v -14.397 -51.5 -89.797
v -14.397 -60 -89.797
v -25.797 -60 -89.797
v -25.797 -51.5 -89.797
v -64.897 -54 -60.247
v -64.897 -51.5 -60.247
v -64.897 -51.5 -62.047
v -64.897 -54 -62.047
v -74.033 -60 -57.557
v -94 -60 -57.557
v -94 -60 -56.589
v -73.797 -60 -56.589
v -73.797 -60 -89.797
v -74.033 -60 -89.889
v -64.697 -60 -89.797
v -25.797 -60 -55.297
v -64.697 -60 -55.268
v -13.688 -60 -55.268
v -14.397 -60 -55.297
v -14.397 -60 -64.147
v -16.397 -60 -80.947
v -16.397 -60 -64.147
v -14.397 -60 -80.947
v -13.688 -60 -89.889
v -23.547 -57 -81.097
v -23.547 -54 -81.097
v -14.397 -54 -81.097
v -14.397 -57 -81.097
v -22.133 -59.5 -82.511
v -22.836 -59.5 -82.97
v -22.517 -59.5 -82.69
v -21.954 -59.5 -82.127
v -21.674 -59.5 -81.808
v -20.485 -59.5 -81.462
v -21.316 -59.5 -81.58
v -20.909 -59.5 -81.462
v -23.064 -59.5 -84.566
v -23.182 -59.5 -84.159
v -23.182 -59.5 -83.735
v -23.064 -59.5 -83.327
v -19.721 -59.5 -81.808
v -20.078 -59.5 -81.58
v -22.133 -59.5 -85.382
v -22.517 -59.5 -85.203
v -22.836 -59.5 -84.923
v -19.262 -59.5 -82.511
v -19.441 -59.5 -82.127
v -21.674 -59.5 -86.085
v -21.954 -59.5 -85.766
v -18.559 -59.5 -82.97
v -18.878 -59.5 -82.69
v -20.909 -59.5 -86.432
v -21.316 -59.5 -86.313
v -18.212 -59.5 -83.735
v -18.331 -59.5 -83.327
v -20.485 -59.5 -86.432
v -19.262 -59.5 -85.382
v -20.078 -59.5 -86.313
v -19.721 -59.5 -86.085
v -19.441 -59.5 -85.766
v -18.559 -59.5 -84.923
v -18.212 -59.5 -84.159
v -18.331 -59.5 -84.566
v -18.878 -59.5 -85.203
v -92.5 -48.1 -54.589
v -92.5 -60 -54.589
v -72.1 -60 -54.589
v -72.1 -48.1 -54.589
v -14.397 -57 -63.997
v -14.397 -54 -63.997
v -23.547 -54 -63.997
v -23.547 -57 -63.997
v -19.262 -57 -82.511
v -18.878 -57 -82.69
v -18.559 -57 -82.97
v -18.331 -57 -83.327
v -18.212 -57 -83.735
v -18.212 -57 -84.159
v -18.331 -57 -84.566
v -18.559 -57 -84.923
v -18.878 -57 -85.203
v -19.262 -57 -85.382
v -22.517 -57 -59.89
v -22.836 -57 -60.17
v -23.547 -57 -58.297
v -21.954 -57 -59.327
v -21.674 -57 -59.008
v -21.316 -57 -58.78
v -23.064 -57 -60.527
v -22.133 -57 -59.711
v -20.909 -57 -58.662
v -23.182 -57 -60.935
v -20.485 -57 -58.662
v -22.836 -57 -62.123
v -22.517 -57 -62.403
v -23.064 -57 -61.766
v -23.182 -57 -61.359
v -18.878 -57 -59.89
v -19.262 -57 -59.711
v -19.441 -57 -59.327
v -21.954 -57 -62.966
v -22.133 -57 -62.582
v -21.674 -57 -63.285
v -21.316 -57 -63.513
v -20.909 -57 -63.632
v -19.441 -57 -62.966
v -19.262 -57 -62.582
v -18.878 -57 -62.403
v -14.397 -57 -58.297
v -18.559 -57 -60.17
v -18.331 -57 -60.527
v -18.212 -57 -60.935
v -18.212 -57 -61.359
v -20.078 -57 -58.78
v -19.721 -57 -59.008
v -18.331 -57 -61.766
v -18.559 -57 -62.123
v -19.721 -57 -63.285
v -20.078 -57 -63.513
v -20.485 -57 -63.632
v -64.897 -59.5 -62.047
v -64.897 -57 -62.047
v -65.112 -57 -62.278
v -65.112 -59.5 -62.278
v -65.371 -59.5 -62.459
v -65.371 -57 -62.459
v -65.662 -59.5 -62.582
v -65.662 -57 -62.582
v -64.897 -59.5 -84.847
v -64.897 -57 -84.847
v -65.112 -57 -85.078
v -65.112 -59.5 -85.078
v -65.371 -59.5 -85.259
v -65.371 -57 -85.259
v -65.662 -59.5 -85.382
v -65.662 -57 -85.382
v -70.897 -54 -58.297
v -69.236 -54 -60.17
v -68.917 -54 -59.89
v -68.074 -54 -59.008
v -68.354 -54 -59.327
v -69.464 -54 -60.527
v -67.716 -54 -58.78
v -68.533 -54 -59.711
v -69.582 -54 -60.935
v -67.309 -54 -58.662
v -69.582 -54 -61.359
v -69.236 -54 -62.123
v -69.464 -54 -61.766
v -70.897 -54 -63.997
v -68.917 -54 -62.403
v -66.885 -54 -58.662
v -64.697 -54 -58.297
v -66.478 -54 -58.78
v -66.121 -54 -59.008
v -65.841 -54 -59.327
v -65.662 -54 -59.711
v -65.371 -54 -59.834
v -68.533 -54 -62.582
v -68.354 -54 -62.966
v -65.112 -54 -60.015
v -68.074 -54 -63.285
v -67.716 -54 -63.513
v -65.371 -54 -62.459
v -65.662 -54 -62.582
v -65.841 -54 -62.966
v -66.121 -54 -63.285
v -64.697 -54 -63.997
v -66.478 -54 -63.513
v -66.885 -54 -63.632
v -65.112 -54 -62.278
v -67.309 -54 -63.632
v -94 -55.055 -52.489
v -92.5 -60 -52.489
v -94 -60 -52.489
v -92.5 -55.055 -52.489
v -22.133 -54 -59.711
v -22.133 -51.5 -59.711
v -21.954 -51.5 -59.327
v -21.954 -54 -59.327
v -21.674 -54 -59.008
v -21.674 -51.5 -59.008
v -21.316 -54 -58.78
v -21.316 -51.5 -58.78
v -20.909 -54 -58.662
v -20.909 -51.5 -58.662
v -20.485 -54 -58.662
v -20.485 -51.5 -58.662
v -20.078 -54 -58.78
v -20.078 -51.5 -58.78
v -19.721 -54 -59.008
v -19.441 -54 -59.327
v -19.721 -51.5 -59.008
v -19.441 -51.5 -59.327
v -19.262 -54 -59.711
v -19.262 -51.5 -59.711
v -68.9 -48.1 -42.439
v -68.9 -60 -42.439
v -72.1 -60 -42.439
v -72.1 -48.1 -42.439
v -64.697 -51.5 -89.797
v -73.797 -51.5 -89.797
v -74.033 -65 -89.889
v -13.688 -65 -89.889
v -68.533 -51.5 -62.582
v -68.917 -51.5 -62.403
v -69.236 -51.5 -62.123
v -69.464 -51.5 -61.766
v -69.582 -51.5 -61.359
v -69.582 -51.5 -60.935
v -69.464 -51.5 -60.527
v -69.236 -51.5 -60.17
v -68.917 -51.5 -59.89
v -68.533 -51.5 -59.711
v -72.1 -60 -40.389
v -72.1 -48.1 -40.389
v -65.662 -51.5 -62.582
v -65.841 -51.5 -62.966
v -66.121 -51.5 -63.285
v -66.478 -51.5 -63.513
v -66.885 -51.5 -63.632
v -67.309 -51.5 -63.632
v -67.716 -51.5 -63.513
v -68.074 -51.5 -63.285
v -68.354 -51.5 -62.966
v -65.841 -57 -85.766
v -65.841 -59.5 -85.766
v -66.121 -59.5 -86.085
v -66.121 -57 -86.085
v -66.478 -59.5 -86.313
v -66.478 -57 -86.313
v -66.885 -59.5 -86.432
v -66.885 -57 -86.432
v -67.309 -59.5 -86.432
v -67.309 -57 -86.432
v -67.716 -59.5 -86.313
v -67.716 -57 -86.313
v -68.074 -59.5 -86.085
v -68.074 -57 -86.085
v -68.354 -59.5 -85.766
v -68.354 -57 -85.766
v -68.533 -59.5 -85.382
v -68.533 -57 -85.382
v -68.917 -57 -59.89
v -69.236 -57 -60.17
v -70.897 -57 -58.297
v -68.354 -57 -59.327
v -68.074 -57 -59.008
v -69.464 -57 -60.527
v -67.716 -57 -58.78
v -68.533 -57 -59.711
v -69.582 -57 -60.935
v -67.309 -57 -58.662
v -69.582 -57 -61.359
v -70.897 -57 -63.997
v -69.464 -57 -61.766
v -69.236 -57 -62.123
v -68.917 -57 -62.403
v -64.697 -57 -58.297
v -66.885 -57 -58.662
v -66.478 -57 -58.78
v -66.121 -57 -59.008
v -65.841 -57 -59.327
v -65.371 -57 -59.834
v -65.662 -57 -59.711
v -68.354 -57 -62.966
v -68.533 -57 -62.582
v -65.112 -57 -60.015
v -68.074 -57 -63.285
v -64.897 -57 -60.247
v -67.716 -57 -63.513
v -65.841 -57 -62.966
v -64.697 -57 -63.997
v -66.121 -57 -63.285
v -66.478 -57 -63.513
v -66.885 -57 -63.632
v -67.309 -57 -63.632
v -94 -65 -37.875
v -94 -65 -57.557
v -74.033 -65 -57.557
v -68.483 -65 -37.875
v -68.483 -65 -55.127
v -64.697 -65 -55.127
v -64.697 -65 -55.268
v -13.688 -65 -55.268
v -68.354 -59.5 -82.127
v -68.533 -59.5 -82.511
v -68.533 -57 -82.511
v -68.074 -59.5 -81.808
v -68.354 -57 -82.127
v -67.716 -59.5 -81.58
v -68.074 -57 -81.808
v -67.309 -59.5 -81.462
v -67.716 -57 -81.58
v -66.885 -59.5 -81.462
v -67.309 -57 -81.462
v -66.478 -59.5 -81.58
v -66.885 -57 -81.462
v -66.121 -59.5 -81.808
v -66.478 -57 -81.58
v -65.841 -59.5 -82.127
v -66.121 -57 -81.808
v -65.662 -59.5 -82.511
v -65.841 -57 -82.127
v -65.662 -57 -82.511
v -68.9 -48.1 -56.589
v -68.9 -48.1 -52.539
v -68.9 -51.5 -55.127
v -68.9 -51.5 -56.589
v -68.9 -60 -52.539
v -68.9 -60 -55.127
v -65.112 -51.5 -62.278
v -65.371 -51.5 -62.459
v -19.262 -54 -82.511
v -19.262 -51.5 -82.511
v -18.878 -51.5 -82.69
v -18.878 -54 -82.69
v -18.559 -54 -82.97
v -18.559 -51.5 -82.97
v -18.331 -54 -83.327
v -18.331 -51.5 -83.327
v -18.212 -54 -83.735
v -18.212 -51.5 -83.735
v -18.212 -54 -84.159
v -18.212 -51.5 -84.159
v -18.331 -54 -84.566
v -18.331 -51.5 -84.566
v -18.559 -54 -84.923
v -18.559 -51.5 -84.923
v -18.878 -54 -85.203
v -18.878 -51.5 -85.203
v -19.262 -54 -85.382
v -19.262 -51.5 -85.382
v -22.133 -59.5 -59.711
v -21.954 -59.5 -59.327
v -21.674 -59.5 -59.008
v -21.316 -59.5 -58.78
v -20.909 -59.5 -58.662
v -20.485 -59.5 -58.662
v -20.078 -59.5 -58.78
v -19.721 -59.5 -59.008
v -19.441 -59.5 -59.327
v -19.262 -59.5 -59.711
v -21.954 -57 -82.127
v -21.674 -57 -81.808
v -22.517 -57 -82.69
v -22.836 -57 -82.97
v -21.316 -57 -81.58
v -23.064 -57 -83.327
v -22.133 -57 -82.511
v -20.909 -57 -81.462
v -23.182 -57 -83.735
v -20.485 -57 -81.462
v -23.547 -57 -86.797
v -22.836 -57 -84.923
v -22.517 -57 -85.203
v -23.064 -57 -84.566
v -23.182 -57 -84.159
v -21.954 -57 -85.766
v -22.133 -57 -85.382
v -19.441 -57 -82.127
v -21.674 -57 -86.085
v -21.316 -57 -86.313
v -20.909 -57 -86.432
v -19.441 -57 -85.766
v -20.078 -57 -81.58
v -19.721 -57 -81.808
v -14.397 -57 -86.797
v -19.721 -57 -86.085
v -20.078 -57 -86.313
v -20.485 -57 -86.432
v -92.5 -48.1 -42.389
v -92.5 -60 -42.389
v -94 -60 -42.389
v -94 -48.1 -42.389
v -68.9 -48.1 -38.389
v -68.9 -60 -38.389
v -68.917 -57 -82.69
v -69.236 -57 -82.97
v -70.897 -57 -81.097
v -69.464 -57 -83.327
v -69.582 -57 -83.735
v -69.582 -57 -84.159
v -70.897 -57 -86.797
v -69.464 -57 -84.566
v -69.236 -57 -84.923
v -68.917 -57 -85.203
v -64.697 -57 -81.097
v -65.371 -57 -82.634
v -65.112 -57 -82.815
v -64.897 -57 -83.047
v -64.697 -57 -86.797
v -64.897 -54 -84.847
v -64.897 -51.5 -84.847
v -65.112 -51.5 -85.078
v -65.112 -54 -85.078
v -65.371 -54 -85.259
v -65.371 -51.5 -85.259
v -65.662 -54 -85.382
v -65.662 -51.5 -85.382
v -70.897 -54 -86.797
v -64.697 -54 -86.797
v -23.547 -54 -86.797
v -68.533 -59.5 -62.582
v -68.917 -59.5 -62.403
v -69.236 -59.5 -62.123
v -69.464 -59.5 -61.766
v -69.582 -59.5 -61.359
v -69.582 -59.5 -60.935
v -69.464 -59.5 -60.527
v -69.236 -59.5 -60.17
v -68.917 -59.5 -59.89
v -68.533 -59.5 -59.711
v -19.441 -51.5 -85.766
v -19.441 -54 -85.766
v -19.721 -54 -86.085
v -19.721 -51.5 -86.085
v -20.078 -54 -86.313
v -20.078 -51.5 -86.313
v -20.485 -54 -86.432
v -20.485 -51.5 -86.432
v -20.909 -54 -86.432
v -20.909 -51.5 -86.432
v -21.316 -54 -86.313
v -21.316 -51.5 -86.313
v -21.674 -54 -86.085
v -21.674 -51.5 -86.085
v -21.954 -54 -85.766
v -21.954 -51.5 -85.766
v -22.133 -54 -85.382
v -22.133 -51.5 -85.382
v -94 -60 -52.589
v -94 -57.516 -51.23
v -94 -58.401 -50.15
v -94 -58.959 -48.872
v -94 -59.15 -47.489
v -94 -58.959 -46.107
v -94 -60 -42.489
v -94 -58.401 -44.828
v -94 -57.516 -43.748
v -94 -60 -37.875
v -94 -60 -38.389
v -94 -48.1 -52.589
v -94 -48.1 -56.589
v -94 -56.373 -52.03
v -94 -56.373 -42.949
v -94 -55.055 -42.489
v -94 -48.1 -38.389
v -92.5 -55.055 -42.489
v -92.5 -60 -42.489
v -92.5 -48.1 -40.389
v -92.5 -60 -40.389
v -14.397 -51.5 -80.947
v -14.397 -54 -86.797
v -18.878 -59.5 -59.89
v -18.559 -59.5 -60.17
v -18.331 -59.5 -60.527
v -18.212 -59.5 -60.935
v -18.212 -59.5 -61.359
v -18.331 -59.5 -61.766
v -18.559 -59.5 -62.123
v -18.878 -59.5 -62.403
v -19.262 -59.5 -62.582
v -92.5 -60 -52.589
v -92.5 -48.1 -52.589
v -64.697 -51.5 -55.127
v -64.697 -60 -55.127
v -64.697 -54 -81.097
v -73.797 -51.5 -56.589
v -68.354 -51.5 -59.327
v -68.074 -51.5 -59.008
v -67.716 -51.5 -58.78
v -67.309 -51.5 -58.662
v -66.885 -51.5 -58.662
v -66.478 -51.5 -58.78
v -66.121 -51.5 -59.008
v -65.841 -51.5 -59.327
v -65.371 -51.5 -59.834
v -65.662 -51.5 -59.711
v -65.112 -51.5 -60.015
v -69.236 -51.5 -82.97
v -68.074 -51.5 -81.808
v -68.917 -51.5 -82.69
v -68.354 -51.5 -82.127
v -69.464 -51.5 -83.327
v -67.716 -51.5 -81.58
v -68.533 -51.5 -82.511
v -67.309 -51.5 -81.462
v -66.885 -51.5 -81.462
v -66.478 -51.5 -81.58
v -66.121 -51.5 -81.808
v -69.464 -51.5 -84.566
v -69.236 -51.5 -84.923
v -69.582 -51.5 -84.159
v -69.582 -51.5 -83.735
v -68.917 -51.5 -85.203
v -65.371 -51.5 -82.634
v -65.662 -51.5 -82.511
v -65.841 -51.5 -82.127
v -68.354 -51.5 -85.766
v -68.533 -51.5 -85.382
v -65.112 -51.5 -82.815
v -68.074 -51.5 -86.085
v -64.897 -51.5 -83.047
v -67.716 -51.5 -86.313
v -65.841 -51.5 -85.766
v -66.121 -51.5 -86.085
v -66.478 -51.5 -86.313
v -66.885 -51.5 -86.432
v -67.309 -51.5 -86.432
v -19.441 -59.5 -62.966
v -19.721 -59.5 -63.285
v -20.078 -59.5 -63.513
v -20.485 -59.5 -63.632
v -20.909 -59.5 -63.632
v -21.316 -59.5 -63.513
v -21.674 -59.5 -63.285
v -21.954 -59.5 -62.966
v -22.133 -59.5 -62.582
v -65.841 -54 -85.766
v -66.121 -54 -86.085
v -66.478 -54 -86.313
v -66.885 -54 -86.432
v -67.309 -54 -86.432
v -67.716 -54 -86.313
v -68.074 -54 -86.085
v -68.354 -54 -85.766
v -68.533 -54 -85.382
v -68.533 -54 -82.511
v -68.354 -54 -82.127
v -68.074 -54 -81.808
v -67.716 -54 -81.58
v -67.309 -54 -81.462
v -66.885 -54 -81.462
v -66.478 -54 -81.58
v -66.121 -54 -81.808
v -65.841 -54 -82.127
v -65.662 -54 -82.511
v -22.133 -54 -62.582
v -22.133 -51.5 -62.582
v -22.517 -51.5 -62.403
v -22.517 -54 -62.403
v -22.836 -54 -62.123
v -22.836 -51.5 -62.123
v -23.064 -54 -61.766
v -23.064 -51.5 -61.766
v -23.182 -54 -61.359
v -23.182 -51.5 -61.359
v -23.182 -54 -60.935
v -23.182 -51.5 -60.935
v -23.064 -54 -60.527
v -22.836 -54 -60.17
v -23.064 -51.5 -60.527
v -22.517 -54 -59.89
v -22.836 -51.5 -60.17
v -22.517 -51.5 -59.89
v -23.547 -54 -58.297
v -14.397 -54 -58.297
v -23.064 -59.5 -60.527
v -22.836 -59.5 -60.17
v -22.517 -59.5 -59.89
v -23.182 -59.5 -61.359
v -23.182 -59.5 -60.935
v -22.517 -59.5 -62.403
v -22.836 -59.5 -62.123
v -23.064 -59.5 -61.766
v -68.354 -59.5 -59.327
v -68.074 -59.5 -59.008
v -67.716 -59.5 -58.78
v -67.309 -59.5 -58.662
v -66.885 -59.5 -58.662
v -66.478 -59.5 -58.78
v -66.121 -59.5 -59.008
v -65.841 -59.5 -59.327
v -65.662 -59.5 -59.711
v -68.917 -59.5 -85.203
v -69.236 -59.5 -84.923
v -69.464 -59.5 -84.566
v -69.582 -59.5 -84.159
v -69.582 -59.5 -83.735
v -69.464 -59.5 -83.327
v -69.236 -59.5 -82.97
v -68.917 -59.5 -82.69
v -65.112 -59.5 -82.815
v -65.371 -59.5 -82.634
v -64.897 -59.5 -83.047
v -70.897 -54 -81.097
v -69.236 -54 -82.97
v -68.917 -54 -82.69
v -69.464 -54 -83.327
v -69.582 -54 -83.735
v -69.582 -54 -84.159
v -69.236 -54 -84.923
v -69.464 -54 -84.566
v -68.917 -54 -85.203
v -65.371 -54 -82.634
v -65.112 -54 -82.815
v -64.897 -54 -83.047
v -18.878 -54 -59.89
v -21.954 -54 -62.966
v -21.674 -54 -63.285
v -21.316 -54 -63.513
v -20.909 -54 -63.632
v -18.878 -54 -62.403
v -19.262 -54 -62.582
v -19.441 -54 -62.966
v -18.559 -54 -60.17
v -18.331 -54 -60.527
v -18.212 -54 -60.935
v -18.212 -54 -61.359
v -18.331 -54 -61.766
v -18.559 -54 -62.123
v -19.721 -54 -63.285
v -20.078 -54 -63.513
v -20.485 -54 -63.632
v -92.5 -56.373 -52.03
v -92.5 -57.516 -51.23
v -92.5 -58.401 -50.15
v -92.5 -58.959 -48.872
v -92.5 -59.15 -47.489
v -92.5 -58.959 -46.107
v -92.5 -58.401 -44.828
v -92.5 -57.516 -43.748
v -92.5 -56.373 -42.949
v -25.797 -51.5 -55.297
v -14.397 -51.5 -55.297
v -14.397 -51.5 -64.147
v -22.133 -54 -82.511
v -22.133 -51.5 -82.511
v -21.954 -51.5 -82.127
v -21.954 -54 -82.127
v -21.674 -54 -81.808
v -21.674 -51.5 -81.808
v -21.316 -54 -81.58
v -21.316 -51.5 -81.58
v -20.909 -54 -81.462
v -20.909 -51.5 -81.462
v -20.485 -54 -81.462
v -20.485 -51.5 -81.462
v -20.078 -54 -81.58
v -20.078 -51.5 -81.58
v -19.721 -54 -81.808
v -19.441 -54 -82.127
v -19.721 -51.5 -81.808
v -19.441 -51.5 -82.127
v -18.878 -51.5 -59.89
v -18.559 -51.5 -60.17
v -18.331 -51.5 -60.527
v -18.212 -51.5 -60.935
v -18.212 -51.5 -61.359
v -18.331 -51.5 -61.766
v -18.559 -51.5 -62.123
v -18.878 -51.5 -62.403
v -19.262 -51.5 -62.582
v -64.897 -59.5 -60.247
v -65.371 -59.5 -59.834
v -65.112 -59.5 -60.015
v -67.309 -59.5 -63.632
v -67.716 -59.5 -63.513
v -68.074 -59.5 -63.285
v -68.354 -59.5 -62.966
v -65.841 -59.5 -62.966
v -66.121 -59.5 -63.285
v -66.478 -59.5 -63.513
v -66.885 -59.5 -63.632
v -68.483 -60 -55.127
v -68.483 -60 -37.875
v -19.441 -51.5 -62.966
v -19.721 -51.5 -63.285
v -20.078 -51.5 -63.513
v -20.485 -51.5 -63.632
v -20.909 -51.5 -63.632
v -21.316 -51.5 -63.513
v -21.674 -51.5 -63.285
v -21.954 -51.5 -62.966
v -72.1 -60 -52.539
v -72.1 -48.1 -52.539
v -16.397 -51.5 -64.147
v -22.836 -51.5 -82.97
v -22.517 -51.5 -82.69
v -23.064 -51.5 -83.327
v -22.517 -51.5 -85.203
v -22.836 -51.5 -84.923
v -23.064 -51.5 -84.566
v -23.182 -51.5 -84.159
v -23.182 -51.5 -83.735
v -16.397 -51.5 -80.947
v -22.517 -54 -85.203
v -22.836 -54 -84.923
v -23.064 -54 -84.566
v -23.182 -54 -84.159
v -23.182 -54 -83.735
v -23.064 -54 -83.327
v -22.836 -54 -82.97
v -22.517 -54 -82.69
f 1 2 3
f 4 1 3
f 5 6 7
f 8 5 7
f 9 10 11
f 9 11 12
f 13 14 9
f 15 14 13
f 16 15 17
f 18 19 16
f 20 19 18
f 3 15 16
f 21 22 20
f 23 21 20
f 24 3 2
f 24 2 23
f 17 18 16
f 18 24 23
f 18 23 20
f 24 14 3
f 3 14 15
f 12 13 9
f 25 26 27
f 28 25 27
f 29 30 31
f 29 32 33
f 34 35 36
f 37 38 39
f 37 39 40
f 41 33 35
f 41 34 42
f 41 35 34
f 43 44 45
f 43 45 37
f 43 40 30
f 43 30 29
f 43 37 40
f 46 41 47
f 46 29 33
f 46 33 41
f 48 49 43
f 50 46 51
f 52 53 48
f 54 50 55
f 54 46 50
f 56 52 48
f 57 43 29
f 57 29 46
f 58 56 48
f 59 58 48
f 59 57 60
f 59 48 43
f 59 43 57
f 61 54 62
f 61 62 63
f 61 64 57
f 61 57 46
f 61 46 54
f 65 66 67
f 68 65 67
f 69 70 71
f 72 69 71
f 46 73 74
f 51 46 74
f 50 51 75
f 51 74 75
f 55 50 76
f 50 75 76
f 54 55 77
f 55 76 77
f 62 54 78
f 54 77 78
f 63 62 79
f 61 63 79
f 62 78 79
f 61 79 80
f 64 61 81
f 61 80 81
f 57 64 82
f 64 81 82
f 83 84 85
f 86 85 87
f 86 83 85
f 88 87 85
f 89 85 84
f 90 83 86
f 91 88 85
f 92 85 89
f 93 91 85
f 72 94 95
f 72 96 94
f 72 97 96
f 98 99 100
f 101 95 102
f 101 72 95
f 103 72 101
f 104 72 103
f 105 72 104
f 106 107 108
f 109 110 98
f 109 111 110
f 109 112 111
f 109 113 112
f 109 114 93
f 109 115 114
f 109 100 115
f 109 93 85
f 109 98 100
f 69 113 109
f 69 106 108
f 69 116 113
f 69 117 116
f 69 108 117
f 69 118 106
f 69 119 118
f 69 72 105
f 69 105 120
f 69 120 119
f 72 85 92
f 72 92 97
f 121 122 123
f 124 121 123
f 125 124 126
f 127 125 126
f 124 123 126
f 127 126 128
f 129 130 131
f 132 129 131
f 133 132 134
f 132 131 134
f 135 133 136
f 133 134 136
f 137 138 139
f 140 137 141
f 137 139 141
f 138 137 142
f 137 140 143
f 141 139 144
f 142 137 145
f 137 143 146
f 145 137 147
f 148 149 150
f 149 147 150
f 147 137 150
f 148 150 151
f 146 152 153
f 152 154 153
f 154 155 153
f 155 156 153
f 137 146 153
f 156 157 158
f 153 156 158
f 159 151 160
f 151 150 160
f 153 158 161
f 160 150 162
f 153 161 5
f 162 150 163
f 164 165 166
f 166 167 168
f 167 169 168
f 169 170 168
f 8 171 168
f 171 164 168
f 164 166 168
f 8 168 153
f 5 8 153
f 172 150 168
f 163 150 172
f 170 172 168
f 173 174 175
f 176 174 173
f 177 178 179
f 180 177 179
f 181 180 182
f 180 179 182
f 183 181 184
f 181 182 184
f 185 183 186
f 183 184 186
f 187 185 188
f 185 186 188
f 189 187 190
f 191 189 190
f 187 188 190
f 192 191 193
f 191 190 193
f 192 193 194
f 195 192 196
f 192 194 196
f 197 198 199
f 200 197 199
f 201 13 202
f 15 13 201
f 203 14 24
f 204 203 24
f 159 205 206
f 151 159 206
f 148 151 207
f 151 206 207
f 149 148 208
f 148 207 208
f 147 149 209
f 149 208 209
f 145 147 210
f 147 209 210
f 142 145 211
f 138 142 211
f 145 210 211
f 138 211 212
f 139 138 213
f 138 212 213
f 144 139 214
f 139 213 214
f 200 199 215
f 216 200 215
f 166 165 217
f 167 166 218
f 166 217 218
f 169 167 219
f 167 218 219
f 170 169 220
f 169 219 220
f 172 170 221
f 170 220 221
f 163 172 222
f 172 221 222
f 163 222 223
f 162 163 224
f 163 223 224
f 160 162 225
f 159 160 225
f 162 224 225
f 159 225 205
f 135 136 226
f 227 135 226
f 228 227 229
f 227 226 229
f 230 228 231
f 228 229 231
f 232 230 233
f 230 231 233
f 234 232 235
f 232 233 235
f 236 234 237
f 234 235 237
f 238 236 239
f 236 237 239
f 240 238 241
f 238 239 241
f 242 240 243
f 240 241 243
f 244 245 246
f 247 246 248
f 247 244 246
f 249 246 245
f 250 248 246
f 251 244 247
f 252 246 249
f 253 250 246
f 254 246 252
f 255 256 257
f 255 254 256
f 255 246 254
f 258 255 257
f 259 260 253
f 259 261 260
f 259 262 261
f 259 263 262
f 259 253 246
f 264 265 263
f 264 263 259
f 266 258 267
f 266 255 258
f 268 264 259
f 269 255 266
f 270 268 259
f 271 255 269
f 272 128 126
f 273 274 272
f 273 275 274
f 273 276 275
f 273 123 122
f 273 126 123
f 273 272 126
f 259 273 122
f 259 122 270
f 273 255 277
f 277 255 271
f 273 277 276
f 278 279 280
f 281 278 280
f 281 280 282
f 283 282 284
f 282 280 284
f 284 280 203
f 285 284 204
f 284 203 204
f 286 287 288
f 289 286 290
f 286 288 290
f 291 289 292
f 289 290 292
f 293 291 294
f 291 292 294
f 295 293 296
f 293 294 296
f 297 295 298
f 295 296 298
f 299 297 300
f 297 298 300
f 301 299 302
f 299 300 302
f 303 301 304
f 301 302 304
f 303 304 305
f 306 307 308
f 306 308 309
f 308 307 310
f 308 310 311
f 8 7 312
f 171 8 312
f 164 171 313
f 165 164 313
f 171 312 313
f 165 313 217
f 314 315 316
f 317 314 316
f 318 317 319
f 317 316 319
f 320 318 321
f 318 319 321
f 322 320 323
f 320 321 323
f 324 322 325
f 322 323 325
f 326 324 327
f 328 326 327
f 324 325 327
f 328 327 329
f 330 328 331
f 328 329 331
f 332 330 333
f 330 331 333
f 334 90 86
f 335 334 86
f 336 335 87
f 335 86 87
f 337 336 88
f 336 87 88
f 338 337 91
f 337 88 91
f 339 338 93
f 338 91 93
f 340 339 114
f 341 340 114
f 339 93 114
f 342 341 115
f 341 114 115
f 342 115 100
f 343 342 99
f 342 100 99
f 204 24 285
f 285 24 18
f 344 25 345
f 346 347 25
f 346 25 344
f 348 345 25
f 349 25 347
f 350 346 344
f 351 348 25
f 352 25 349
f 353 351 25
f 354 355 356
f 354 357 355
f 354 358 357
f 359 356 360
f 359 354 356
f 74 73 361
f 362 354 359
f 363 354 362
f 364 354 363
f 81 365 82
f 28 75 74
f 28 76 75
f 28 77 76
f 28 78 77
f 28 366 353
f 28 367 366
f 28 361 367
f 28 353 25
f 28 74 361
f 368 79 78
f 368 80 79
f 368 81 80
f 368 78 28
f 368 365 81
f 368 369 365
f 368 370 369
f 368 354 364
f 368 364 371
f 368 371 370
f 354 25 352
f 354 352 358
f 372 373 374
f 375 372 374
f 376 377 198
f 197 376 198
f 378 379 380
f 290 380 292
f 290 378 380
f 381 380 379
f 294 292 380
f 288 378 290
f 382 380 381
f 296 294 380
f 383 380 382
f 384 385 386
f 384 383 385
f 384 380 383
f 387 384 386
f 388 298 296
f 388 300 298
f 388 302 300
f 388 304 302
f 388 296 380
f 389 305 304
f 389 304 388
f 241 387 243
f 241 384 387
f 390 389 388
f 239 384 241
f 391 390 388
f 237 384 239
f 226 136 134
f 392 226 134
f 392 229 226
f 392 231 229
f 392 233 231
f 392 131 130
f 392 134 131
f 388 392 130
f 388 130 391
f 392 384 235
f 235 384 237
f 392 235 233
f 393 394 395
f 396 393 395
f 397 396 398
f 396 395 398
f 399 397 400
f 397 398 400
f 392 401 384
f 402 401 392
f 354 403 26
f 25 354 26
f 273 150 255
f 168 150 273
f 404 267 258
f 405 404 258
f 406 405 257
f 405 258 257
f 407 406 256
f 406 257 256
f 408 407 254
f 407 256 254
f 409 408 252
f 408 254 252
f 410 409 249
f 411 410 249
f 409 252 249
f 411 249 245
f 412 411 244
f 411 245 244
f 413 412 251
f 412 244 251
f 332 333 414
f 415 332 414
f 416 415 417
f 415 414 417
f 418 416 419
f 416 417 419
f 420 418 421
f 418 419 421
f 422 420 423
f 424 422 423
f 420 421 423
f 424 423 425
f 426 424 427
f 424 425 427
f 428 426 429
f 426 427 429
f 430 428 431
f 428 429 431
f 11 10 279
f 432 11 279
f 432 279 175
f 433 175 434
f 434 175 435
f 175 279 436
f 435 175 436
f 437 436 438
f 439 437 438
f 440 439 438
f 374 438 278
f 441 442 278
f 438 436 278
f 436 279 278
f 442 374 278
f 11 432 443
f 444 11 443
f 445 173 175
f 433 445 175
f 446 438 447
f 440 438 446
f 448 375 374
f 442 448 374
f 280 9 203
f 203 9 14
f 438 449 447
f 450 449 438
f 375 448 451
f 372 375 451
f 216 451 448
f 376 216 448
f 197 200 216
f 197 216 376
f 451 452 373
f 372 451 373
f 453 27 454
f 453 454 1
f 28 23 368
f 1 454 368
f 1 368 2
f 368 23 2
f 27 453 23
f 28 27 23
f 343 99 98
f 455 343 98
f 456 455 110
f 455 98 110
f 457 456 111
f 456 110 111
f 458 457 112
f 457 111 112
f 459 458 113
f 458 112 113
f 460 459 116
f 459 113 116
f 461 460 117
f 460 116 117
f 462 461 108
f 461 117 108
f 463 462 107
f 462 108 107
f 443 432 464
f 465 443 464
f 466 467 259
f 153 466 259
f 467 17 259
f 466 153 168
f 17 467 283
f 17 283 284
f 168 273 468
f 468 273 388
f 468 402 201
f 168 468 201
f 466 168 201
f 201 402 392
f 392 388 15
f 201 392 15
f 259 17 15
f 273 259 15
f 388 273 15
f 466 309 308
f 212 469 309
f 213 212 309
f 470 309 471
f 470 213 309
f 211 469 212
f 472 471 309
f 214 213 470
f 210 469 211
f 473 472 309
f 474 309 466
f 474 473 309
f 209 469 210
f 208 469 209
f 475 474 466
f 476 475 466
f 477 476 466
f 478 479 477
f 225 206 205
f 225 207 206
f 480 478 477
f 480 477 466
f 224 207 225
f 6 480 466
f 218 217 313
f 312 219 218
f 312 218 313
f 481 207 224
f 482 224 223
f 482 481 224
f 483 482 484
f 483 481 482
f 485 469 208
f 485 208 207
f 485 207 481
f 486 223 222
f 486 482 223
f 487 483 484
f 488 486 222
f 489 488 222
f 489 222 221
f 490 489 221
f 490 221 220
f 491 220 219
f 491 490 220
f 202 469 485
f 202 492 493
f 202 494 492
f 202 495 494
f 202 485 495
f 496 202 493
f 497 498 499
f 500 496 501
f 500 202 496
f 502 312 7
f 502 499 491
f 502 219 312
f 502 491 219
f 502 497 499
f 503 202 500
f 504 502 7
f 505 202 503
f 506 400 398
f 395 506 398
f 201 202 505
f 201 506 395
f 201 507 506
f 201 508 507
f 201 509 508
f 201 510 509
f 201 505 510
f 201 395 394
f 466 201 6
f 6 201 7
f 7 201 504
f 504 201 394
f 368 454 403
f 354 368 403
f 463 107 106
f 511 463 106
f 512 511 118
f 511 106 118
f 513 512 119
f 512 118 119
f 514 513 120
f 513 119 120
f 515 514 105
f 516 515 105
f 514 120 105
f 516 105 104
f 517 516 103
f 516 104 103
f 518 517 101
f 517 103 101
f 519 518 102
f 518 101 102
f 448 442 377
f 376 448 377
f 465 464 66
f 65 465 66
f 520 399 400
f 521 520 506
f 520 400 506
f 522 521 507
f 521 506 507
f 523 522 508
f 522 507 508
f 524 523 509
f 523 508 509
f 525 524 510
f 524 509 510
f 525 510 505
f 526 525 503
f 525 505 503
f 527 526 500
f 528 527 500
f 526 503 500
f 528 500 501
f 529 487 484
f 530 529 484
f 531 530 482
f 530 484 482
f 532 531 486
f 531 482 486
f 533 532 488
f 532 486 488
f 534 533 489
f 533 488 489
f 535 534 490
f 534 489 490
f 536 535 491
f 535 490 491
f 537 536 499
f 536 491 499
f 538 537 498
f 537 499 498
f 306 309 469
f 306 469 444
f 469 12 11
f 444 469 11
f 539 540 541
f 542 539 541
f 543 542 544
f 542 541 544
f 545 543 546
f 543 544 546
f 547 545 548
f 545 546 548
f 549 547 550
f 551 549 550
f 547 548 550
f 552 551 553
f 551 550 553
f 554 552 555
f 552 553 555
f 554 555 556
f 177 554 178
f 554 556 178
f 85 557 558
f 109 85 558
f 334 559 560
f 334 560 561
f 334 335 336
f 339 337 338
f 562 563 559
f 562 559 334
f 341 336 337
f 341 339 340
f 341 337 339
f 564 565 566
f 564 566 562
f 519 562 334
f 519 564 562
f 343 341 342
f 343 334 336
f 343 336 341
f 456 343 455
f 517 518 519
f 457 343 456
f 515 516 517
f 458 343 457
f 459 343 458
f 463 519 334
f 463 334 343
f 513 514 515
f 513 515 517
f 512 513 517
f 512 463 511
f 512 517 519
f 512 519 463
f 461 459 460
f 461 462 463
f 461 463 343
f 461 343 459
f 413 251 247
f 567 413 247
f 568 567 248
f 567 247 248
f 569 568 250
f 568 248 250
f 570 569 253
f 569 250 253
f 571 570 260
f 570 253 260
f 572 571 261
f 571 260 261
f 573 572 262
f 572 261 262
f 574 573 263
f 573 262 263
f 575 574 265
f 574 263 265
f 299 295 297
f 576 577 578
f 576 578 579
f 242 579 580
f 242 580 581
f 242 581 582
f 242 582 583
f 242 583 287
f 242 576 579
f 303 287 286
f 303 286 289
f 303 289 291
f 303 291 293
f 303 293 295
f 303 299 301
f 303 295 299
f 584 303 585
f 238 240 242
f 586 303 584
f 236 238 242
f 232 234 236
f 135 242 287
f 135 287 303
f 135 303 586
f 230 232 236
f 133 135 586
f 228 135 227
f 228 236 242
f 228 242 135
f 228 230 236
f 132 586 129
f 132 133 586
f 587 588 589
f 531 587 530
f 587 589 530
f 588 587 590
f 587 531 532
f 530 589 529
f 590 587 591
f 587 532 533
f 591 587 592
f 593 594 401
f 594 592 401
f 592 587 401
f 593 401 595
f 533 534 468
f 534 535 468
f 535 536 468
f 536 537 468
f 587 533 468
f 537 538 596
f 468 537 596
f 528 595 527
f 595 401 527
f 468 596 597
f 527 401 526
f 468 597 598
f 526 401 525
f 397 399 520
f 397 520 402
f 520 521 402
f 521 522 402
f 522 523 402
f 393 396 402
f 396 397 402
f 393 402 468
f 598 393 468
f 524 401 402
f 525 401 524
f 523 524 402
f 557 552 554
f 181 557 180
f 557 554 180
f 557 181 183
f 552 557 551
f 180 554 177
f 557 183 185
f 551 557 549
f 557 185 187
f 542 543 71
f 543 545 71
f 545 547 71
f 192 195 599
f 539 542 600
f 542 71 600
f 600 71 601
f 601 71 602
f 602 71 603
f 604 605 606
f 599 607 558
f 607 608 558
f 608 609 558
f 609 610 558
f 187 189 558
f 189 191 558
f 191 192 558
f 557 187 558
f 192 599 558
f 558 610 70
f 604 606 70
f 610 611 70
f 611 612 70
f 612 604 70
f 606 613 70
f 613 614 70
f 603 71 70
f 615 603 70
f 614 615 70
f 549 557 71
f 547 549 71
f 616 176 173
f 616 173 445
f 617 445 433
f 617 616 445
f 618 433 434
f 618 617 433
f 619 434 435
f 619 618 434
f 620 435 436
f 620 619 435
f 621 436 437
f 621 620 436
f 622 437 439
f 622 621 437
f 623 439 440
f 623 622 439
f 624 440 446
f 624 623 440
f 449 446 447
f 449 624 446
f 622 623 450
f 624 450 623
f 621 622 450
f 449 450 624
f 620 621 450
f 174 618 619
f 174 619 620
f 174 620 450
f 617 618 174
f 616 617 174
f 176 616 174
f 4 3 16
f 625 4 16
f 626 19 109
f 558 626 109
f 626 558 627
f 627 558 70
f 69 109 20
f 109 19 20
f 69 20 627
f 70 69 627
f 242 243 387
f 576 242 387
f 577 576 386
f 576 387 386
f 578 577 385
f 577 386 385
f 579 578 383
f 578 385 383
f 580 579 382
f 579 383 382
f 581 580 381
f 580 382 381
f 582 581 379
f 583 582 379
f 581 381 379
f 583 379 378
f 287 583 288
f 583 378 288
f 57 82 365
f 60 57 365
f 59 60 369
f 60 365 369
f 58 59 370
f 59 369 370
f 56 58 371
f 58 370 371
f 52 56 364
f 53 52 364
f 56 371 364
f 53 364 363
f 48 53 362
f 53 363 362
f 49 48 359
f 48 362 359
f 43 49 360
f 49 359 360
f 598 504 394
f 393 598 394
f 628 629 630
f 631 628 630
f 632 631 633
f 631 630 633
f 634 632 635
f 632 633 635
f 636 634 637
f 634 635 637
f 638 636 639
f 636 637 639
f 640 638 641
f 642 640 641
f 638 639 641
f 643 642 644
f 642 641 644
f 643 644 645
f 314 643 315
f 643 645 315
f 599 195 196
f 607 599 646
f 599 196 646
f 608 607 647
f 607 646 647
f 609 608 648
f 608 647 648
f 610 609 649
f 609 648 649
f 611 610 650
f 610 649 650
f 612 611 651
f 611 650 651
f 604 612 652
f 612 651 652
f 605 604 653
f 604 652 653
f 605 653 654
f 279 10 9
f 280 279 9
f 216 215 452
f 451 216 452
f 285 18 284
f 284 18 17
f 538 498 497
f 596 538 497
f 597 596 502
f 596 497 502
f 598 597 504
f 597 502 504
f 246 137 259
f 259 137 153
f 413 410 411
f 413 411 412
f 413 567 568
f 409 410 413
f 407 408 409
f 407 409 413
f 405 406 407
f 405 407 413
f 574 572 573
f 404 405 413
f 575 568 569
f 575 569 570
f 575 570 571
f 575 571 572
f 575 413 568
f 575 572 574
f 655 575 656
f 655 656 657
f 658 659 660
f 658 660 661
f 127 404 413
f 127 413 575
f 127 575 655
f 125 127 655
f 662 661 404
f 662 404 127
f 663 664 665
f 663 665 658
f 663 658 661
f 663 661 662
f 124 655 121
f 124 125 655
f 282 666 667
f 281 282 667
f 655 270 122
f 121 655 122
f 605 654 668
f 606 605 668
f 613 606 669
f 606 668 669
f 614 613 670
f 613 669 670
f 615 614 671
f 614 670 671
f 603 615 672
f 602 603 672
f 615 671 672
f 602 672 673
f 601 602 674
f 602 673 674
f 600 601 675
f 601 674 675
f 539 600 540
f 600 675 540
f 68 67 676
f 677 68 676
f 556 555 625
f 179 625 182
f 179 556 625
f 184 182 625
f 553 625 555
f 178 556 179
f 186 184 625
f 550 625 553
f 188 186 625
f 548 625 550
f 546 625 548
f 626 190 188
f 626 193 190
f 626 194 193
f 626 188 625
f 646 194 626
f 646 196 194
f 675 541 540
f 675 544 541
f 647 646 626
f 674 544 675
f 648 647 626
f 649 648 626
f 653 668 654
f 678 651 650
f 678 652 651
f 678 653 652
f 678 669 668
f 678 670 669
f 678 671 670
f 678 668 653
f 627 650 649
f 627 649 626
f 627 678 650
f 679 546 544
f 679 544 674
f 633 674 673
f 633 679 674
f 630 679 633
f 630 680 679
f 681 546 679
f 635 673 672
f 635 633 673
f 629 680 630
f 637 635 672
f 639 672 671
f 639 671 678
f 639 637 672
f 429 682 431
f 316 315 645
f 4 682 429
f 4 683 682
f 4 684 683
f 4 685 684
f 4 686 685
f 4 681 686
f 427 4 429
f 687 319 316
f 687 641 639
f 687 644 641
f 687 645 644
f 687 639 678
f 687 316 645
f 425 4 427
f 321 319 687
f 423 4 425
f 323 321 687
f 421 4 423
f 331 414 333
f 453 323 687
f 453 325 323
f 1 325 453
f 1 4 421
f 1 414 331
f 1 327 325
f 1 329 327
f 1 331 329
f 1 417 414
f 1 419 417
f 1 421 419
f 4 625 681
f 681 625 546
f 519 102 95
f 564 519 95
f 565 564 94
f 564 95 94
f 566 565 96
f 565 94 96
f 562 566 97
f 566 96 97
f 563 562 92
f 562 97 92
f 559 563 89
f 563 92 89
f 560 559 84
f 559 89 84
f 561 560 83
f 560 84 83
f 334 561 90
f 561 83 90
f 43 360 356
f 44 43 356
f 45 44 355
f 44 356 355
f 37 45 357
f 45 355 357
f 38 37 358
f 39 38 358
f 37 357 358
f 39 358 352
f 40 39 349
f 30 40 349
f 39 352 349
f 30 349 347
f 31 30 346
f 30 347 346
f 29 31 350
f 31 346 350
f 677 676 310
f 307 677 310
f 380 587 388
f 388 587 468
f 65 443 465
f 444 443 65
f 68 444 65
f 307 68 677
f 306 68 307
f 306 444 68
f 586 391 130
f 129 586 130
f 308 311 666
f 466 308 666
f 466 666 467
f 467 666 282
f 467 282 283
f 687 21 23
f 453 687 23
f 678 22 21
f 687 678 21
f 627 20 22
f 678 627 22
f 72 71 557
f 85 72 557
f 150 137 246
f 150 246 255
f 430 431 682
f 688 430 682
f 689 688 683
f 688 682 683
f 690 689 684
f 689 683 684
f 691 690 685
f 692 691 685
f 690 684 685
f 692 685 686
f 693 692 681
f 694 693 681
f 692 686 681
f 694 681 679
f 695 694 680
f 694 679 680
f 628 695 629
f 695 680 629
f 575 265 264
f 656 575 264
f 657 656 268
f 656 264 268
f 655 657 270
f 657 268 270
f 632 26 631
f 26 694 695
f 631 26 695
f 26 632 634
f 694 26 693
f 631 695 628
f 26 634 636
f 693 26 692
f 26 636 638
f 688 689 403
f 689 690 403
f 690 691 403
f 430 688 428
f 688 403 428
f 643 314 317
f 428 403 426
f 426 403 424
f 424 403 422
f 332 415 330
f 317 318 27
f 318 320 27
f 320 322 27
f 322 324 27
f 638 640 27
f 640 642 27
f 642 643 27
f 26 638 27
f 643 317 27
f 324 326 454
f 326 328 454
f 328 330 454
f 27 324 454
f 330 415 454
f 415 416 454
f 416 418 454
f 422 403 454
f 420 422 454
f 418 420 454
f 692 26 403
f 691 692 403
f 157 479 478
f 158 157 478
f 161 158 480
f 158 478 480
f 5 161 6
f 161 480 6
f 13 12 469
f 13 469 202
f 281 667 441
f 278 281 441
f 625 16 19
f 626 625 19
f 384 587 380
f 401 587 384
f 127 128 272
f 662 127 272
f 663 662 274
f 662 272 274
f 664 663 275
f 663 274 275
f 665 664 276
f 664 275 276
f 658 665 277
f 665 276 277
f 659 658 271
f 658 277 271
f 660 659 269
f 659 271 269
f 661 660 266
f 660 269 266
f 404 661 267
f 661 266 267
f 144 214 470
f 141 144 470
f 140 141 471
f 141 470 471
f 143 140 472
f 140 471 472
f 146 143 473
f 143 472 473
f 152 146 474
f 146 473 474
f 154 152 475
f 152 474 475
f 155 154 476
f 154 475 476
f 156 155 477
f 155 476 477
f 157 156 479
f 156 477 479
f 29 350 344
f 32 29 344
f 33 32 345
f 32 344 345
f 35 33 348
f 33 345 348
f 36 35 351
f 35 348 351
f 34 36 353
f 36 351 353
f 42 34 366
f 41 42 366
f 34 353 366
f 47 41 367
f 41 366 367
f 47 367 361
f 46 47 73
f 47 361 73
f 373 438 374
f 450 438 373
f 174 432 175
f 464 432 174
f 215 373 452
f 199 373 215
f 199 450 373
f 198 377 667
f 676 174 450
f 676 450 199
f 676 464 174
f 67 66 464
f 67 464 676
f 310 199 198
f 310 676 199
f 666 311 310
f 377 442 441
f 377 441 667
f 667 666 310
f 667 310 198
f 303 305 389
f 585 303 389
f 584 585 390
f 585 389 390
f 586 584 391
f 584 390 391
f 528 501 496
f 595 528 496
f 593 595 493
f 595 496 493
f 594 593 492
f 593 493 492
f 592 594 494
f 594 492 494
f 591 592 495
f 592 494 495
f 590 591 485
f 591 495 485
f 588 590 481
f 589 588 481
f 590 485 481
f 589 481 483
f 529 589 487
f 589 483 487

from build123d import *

# Parameters (mm, degrees)
BOSS_EXTRUDE3_START = -60
BOSS_EXTRUDE3_DEPTH = 5
SKETCH6_W           = 13.796901398
SKETCH6_H           = 14
SKETCH6_W_2         = 14
SKETCH6_H_2         = 16.306866668
SKETCH6_H_3         = 11.42033936
SKETCH6_W_3         = 14.889517864
SKETCH6_W_4         = 7.903270842
SKETCH6_H_4         = 11.041106068
SKETCH6_H_5         = 16.422438658
SKETCH6_H_6         = 19.310292274
SKETCH6_W_5         = 17.660118142
BOSS_EXTRUDE4_DEPTH = 37
BOSS_EXTRUDE5_DEPTH = 2
SKETCH8_R           = 1.55
CUT_EXTRUDE1_DEPTH  = 6
CUT_EXTRUDE2_START  = -2.5
CUT_EXTRUDE2_DEPTH  = 3
SKETCH10_W          = 29.9
SKETCH10_H          = 3
BOSS_EXTRUDE6_DEPTH = 3.1
SKETCH11_W          = 9.1
SKETCH11_H          = 34.669989019
BOSS_EXTRUDE7_DEPTH = 8.5
CUT_EXTRUDE3_DEPTH  = 8
CUT_EXTRUDE4_START  = -2.5
SKETCH14_W          = 7.6
SKETCH14_H          = 5.7
CUT_EXTRUDE4_DEPTH  = 3
BOSS_EXTRUDE8_DEPTH = 11.9
BOSS_EXTRUDE9_DEPTH = 1.499673419
CUT_EXTRUDE5_START  = 100
CUT_EXTRUDE5_DEPTH  = 200


with BuildPart() as part:
    # Sketch4 → Boss-Extrude3 (new body)
    with BuildSketch(Plane(origin=(0, 0, 0), x_dir=(1, 0, 0), z_dir=(0, 1, 0)).offset(BOSS_EXTRUDE3_START)):
        with BuildLine():
            Line((-79, -95), (79, -95))
            ThreePointArc((79, -95), (89.606601718, -90.606601718), (94, -80))
            Line((94, -80), (94, 80))
            ThreePointArc((94, 80), (89.606601718, 90.606601718), (79, 95))
            Line((79, 95), (-79, 95))
            ThreePointArc((-79, 95), (-89.606601718, 90.606601718), (-94, 80))
            Line((-94, 80), (-94, -80))
            ThreePointArc((-94, -80), (-89.606601718, -90.606601718), (-79, -95))
        make_face()
    extrude(amount=-BOSS_EXTRUDE3_DEPTH)

    # Sketch6 → Boss-Extrude4 (add)
    with BuildSketch(Plane(origin=(0, -60, 0), x_dir=(1, 0, 0), z_dir=(0, 1, 0))):
        with Locations((-70.8, 28.476784962)):
            Rectangle(SKETCH6_W, SKETCH6_H)
        with Locations((-39.020266387, 46.394045725)):
            Rectangle(SKETCH6_W_2, SKETCH6_H_2)
        with Locations((-7.988118752, 46.394045725)):
            Rectangle(SKETCH6_W_2, SKETCH6_H_2)
        with Locations((44.22727414, 46.394045725)):
            Rectangle(SKETCH6_W_2, SKETCH6_H_3)
        with Locations((72.6, 21.076479756)):
            Rectangle(SKETCH6_W_3, SKETCH6_H)
        with Locations((85.64, -55.06805056)):
            Rectangle(SKETCH6_W_4, SKETCH6_H)
        with Locations((57.347578499, -73.605954275)):
            Rectangle(SKETCH6_W_2, SKETCH6_H_4)
        with Locations((10.023553356, -73.605954275)):
            Rectangle(SKETCH6_W_2, SKETCH6_H_5)
        with Locations((-36.834989572, -73.605954275)):
            Rectangle(SKETCH6_W_2, SKETCH6_H_6)
        with Locations((-70.8, -52.206798888)):
            Rectangle(SKETCH6_W_5, SKETCH6_H)
    extrude(amount=BOSS_EXTRUDE4_DEPTH)

    # Sketch7 → Boss-Extrude5 (add)
    with BuildSketch(Plane(origin=(0, -23, 0), x_dir=(1, 0, 0), z_dir=(0, 1, 0))):
        Polygon((-70.8, -56.406798888), (-75, -56.406798888), (-75, -48.006798888), (-70.8, -48.006798888), (-70.8, -45.206798888), (-79.630059071, -45.206798888), (-79.630059071, -59.206798888), (-70.8, -59.206798888), align=None)
        Polygon((-41.034989572, -77.805954275), (-41.034989572, -73.605954275), (-43.834989572, -73.605954275), (-43.834989572, -83.261100412), (-29.834989572, -83.261100412), (-29.834989572, -73.605954275), (-32.634989572, -73.605954275), (-32.634989572, -77.805954275), align=None)
        Polygon((37.22727414, 46.394045725), (40.02727414, 46.394045725), (40.02727414, 50.594045725), (48.42727414, 50.594045725), (48.42727414, 46.394045725), (51.22727414, 46.394045725), (51.22727414, 52.104215405), (37.22727414, 52.104215405), align=None)
        Polygon((-14.988118752, 46.394045725), (-12.188118752, 46.394045725), (-12.188118752, 50.594045725), (-3.788118752, 50.594045725), (-3.788118752, 46.394045725), (-0.988118752, 46.394045725), (-0.988118752, 54.547479059), (-14.988118752, 54.547479059), align=None)
        Polygon((-46.020266387, 46.394045725), (-43.220266387, 46.394045725), (-43.220266387, 50.594045725), (-34.820266387, 50.594045725), (-34.820266387, 46.394045725), (-32.020266387, 46.394045725), (-32.020266387, 54.547479059), (-46.020266387, 54.547479059), align=None)
        Polygon((-70.8, 24.276784962), (-75, 24.276784962), (-75, 32.676784962), (-70.8, 32.676784962), (-70.8, 35.476784962), (-77.698450699, 35.476784962), (-77.698450699, 21.476784962), (-70.8, 21.476784962), align=None)
        Polygon((64.347578499, -73.605954275), (61.547578499, -73.605954275), (61.547578499, -77.805954275), (53.147578499, -77.805954275), (53.147578499, -73.605954275), (50.347578499, -73.605954275), (50.347578499, -79.126507309), (64.347578499, -79.126507309), align=None)
        Polygon((72.6, 25.276479756), (76.8, 25.276479756), (76.8, 16.876479756), (72.6, 16.876479756), (72.6, 14.076479756), (80.044758932, 14.076479756), (80.044758932, 28.076479756), (72.6, 28.076479756), align=None)
        Polygon((17.023553356, -73.605954275), (14.223553356, -73.605954275), (14.223553356, -77.805954275), (5.823553356, -77.805954275), (5.823553356, -73.605954275), (3.023553356, -73.605954275), (3.023553356, -81.817173604), (17.023553356, -81.817173604), align=None)
    extrude(amount=BOSS_EXTRUDE5_DEPTH)

    # Sketch8 → Cut-Extrude1 (cut)
    with BuildSketch(Plane(origin=(0, -23, 0), x_dir=(1, 0, 0), z_dir=(0, 1, 0))):
        with Locations(Location((-36.834989572, -73.605954275, 0), (0, 0, 270))):
            Circle(SKETCH8_R)
        with Locations(Location((-39.020266387, 46.394045725, 0), (0, 0, 270))):
            Circle(SKETCH8_R)
        with Locations(Location((-7.988118752, 46.394045725, 0), (0, 0, 270))):
            Circle(SKETCH8_R)
        with Locations(Location((44.22727414, 46.394045725, 0), (0, 0, 270))):
            Circle(SKETCH8_R)
        with Locations(Location((72.6, 21.076479756, 0), (0, 0, 270))):
            Circle(SKETCH8_R)
        with Locations(Location((85.64, -55.06805056, 0), (0, 0, 270))):
            Circle(SKETCH8_R)
        with Locations(Location((57.347578499, -73.605954275, 0), (0, 0, 270))):
            Circle(SKETCH8_R)
        with Locations(Location((10.023553356, -73.605954275, 0), (0, 0, 270))):
            Circle(SKETCH8_R)
        with Locations(Location((-70.8, -52.206798888, 0), (0, 0, 270))):
            Circle(SKETCH8_R)
        with Locations(Location((-70.8, 28.476784962, 0), (0, 0, 270))):
            Circle(SKETCH8_R)
    extrude(amount=-CUT_EXTRUDE1_DEPTH, mode=Mode.SUBTRACT)

    # Sketch9 → Cut-Extrude2 (cut)
    with BuildSketch(Plane(origin=(0, -23, 0), x_dir=(1, 0, 0), z_dir=(0, 1, 0)).offset(CUT_EXTRUDE2_START)):
        Polygon((-73.65, 25.626784962), (-73.65, 31.326784962), (-67.95, 31.326784962), (-67.95, 25.626784962), (-67.95, 21.476784962), (-73.65, 21.476784962), align=None)
        Polygon((-41.870266387, 43.544045725), (-41.870266387, 49.244045725), (-41.870266387, 54.547479059), (-36.170266387, 54.547479059), (-36.170266387, 49.244045725), (-36.170266387, 43.544045725), align=None)
        Polygon((-10.838118752, 43.544045725), (-10.838118752, 49.244045725), (-10.838118752, 54.547479059), (-5.138118752, 54.547479059), (-5.138118752, 49.244045725), (-5.138118752, 43.544045725), align=None)
        Polygon((41.37727414, 43.544045725), (41.37727414, 49.244045725), (41.37727414, 52.104215405), (47.07727414, 52.104215405), (47.07727414, 49.244045725), (47.07727414, 43.544045725), align=None)
        Polygon((69.75, 18.226479756), (69.75, 23.926479756), (69.75, 28.076479756), (75.45, 28.076479756), (75.45, 23.926479756), (75.45, 18.226479756), align=None)
        Polygon((82.79, -57.91805056), (82.79, -52.21805056), (88.49, -52.21805056), (88.49, -57.91805056), (88.49, -62.06805056), (82.79, -62.06805056), align=None)
        Polygon((54.497578499, -76.455954275), (54.497578499, -70.755954275), (60.197578499, -70.755954275), (60.197578499, -76.455954275), (60.197578499, -79.126507309), (54.497578499, -79.126507309), align=None)
        Polygon((7.173553356, -76.455954275), (7.173553356, -70.755954275), (12.873553356, -70.755954275), (17.023553356, -70.755954275), (17.023553356, -76.455954275), (12.873553356, -76.455954275), align=None)
        Polygon((-39.684989572, -70.755954275), (-33.984989572, -70.755954275), (-33.984989572, -76.455954275), (-39.684989572, -76.455954275), (-43.834989572, -76.455954275), (-43.834989572, -70.755954275), align=None)
        Polygon((-73.65, -55.056798888), (-73.65, -49.356798888), (-73.65, -45.206798888), (-67.95, -45.206798888), (-67.95, -49.356798888), (-67.95, -55.056798888), align=None)
    extrude(amount=-CUT_EXTRUDE2_DEPTH, mode=Mode.SUBTRACT)

    # Sketch10 → Boss-Extrude6 (add)
    with BuildSketch(Plane(origin=(0, -60, 0), x_dir=(1, 0, 0), z_dir=(0, 1, 0))):
        Polygon((-55.431481691, 41.136880013), (-55.431481691, 38.136880013), (-25.531481691, 38.136880013), (-25.531481691, 41.136880013), (-32.020266387, 41.136880013), (-32.020266387, 38.240612391), (-46.020266387, 38.240612391), (-46.020266387, 41.136880013), align=None)
        with Locations((-40.481481691, 18.236880013)):
            Rectangle(SKETCH10_W, SKETCH10_H)
    extrude(amount=BOSS_EXTRUDE6_DEPTH)

    # Sketch11 → Boss-Extrude7 (add)
    with BuildSketch(Plane(origin=(0, -60, 0), x_dir=(1, 0, 0), z_dir=(0, 1, 0))):
        Polygon((-25.797386747, 55.296562101), (-14.397386747, 55.296562101), (-14.397386747, 64.146562101), (-16.397386747, 64.146562101), (-16.397386747, 80.946562101), (-14.397386747, 80.946562101), (-14.397386747, 89.796562101), (-25.797386747, 89.796562101), align=None)
        with Locations((-69.247386747, 72.461567591)):
            Rectangle(SKETCH11_W, SKETCH11_H)
    extrude(amount=BOSS_EXTRUDE7_DEPTH)

    # Sketch12 → Cut-Extrude3 (cut)
    with BuildSketch(Plane(origin=(0, -51.5, 0), x_dir=(1, 0, 0), z_dir=(0, 1, 0))):
        with BuildLine():
            ThreePointArc((-65.661972401, 82.511147754), (-65.236972805, 82.717868547), (-64.897386747, 83.046562101))
            Line((-64.897386747, 83.046562101), (-64.897386747, 84.846562101))
            ThreePointArc((-64.897386747, 84.846562101), (-65.236972805, 85.175255654), (-65.661972401, 85.381976447))
            ThreePointArc((-65.661972401, 85.381976447), (-67.097386747, 86.446562101), (-68.532801094, 85.381976447))
            ThreePointArc((-68.532801094, 85.381976447), (-69.597386747, 83.946562101), (-68.532801094, 82.511147754))
            ThreePointArc((-68.532801094, 82.511147754), (-67.097386747, 81.446562101), (-65.661972401, 82.511147754))
        make_face()
        with BuildLine():
            ThreePointArc((-19.261972401, 82.511147754), (-18.197386747, 83.946562101), (-19.261972401, 85.381976447))
            ThreePointArc((-19.261972401, 85.381976447), (-20.697386747, 86.446562101), (-22.132801094, 85.381976447))
            ThreePointArc((-22.132801094, 85.381976447), (-23.197386747, 83.946562101), (-22.132801094, 82.511147754))
            ThreePointArc((-22.132801094, 82.511147754), (-20.697386747, 81.446562101), (-19.261972401, 82.511147754))
        make_face()
        with BuildLine():
            ThreePointArc((-19.261972401, 59.711147754), (-18.197386747, 61.146562101), (-19.261972401, 62.581976447))
            ThreePointArc((-19.261972401, 62.581976447), (-20.697386747, 63.646562101), (-22.132801094, 62.581976447))
            ThreePointArc((-22.132801094, 62.581976447), (-23.197386747, 61.146562101), (-22.132801094, 59.711147754))
            ThreePointArc((-22.132801094, 59.711147754), (-20.697386747, 58.646562101), (-19.261972401, 59.711147754))
        make_face()
        with BuildLine():
            ThreePointArc((-65.661972401, 59.711147754), (-65.236972805, 59.917868547), (-64.897386747, 60.246562101))
            Line((-64.897386747, 60.246562101), (-64.897386747, 62.046562101))
            ThreePointArc((-64.897386747, 62.046562101), (-65.236972805, 62.375255654), (-65.661972401, 62.581976447))
            ThreePointArc((-65.661972401, 62.581976447), (-67.097386747, 63.646562101), (-68.532801094, 62.581976447))
            ThreePointArc((-68.532801094, 62.581976447), (-69.597386747, 61.146562101), (-68.532801094, 59.711147754))
            ThreePointArc((-68.532801094, 59.711147754), (-67.097386747, 58.646562101), (-65.661972401, 59.711147754))
        make_face()
    extrude(amount=-CUT_EXTRUDE3_DEPTH, mode=Mode.SUBTRACT)

    # Sketch14 → Cut-Extrude4 (cut)
    with BuildSketch(Plane(origin=(0, -51.5, 0), x_dir=(1, 0, 0), z_dir=(0, 1, 0)).offset(CUT_EXTRUDE4_START)):
        with Locations((-67.097386747, 83.946562101)):
            Rectangle(SKETCH14_W, SKETCH14_H)
        with Locations((-67.097386747, 61.146562101)):
            Rectangle(SKETCH14_W, SKETCH14_H)
        Polygon((-23.547386747, 81.096562101), (-17.847386747, 81.096562101), (-14.397386747, 81.096562101), (-14.397386747, 86.796562101), (-17.847386747, 86.796562101), (-23.547386747, 86.796562101), align=None)
        Polygon((-23.547386747, 58.296562101), (-17.847386747, 58.296562101), (-14.397386747, 58.296562101), (-14.397386747, 63.996562101), (-17.847386747, 63.996562101), (-23.547386747, 63.996562101), align=None)
    extrude(amount=-CUT_EXTRUDE4_DEPTH, mode=Mode.SUBTRACT)

    # Sketch15 → Boss-Extrude8 (add)
    with BuildSketch(Plane(origin=(0, -60, 0), x_dir=(1, 0, 0), z_dir=(0, 1, 0))):
        Polygon((-94, 52.589239073), (-92.500326581, 52.589239073), (-92.500326581, 54.589239073), (-72.100326581, 54.589239073), (-72.100326581, 52.539239073), (-68.900326581, 52.539239073), (-68.900326581, 56.589239073), (-94, 56.589239073), align=None)
        Polygon((-92.500326581, 40.389239073), (-92.500326581, 42.389239073), (-94, 42.389239073), (-94, 38.389239073), (-68.900326581, 38.389239073), (-68.900326581, 42.439239073), (-72.100326581, 42.439239073), (-72.100326581, 40.389239073), align=None)
    extrude(amount=BOSS_EXTRUDE8_DEPTH)

    # Sketch16 → Boss-Extrude9 (add)
    with BuildSketch(Plane(origin=(-92.500326581, 0, 0), x_dir=(0, 0, -1), z_dir=(1, 0, 0))):
        with BuildLine():
            Line((42.489239073, -60), (52.489239073, -60))
            Line((52.489239073, -60), (52.489239073, -55.054987562))
            ThreePointArc((52.489239073, -55.054987562), (47.489239073, -59.15), (42.489239073, -55.054987562))
            Line((42.489239073, -55.054987562), (42.489239073, -60))
        make_face()
    extrude(amount=-BOSS_EXTRUDE9_DEPTH)

    # Sketch17 → Cut-Extrude5 (cut)
    with BuildSketch(Plane(origin=(0, -60, 0), x_dir=(1, 0, 0), z_dir=(0, 1, 0)).offset(CUT_EXTRUDE5_START)):
        with BuildLine():
            Line((-68.483383313, 37.875054154), (-94, 37.875054154))
            Line((-94, 37.875054154), (-94, -80))
            ThreePointArc((-94, -80), (-89.606601718, -90.606601718), (-79, -95))
            Line((-79, -95), (79, -95))
            ThreePointArc((79, -95), (89.606601718, -90.606601718), (94, -80))
            Line((94, -80), (94, 80))
            ThreePointArc((94, 80), (89.606601718, 90.606601718), (79, 95))
            Line((79, 95), (-79, 95))
            ThreePointArc((-79, 95), (-89.606601718, 90.606601718), (-94, 80))
            Line((-94, 80), (-94, 57.556628821))
            Line((-94, 57.556628821), (-74.033129658, 57.556628821))
            Line((-74.033129658, 57.556628821), (-74.033129658, 89.888723267))
            Line((-74.033129658, 89.888723267), (-13.688048595, 89.888723267))
            Line((-13.688048595, 89.888723267), (-13.688048595, 55.268073627))
            Line((-13.688048595, 55.268073627), (-64.697386747, 55.268073627))
            Line((-64.697386747, 55.268073627), (-64.697386747, 55.126573082))
            Line((-64.697386747, 55.126573082), (-68.483383313, 55.126573082))
            Line((-68.483383313, 55.126573082), (-68.483383313, 37.875054154))
        make_face()
    extrude(amount=-CUT_EXTRUDE5_DEPTH, mode=Mode.SUBTRACT)


solid = part.part
